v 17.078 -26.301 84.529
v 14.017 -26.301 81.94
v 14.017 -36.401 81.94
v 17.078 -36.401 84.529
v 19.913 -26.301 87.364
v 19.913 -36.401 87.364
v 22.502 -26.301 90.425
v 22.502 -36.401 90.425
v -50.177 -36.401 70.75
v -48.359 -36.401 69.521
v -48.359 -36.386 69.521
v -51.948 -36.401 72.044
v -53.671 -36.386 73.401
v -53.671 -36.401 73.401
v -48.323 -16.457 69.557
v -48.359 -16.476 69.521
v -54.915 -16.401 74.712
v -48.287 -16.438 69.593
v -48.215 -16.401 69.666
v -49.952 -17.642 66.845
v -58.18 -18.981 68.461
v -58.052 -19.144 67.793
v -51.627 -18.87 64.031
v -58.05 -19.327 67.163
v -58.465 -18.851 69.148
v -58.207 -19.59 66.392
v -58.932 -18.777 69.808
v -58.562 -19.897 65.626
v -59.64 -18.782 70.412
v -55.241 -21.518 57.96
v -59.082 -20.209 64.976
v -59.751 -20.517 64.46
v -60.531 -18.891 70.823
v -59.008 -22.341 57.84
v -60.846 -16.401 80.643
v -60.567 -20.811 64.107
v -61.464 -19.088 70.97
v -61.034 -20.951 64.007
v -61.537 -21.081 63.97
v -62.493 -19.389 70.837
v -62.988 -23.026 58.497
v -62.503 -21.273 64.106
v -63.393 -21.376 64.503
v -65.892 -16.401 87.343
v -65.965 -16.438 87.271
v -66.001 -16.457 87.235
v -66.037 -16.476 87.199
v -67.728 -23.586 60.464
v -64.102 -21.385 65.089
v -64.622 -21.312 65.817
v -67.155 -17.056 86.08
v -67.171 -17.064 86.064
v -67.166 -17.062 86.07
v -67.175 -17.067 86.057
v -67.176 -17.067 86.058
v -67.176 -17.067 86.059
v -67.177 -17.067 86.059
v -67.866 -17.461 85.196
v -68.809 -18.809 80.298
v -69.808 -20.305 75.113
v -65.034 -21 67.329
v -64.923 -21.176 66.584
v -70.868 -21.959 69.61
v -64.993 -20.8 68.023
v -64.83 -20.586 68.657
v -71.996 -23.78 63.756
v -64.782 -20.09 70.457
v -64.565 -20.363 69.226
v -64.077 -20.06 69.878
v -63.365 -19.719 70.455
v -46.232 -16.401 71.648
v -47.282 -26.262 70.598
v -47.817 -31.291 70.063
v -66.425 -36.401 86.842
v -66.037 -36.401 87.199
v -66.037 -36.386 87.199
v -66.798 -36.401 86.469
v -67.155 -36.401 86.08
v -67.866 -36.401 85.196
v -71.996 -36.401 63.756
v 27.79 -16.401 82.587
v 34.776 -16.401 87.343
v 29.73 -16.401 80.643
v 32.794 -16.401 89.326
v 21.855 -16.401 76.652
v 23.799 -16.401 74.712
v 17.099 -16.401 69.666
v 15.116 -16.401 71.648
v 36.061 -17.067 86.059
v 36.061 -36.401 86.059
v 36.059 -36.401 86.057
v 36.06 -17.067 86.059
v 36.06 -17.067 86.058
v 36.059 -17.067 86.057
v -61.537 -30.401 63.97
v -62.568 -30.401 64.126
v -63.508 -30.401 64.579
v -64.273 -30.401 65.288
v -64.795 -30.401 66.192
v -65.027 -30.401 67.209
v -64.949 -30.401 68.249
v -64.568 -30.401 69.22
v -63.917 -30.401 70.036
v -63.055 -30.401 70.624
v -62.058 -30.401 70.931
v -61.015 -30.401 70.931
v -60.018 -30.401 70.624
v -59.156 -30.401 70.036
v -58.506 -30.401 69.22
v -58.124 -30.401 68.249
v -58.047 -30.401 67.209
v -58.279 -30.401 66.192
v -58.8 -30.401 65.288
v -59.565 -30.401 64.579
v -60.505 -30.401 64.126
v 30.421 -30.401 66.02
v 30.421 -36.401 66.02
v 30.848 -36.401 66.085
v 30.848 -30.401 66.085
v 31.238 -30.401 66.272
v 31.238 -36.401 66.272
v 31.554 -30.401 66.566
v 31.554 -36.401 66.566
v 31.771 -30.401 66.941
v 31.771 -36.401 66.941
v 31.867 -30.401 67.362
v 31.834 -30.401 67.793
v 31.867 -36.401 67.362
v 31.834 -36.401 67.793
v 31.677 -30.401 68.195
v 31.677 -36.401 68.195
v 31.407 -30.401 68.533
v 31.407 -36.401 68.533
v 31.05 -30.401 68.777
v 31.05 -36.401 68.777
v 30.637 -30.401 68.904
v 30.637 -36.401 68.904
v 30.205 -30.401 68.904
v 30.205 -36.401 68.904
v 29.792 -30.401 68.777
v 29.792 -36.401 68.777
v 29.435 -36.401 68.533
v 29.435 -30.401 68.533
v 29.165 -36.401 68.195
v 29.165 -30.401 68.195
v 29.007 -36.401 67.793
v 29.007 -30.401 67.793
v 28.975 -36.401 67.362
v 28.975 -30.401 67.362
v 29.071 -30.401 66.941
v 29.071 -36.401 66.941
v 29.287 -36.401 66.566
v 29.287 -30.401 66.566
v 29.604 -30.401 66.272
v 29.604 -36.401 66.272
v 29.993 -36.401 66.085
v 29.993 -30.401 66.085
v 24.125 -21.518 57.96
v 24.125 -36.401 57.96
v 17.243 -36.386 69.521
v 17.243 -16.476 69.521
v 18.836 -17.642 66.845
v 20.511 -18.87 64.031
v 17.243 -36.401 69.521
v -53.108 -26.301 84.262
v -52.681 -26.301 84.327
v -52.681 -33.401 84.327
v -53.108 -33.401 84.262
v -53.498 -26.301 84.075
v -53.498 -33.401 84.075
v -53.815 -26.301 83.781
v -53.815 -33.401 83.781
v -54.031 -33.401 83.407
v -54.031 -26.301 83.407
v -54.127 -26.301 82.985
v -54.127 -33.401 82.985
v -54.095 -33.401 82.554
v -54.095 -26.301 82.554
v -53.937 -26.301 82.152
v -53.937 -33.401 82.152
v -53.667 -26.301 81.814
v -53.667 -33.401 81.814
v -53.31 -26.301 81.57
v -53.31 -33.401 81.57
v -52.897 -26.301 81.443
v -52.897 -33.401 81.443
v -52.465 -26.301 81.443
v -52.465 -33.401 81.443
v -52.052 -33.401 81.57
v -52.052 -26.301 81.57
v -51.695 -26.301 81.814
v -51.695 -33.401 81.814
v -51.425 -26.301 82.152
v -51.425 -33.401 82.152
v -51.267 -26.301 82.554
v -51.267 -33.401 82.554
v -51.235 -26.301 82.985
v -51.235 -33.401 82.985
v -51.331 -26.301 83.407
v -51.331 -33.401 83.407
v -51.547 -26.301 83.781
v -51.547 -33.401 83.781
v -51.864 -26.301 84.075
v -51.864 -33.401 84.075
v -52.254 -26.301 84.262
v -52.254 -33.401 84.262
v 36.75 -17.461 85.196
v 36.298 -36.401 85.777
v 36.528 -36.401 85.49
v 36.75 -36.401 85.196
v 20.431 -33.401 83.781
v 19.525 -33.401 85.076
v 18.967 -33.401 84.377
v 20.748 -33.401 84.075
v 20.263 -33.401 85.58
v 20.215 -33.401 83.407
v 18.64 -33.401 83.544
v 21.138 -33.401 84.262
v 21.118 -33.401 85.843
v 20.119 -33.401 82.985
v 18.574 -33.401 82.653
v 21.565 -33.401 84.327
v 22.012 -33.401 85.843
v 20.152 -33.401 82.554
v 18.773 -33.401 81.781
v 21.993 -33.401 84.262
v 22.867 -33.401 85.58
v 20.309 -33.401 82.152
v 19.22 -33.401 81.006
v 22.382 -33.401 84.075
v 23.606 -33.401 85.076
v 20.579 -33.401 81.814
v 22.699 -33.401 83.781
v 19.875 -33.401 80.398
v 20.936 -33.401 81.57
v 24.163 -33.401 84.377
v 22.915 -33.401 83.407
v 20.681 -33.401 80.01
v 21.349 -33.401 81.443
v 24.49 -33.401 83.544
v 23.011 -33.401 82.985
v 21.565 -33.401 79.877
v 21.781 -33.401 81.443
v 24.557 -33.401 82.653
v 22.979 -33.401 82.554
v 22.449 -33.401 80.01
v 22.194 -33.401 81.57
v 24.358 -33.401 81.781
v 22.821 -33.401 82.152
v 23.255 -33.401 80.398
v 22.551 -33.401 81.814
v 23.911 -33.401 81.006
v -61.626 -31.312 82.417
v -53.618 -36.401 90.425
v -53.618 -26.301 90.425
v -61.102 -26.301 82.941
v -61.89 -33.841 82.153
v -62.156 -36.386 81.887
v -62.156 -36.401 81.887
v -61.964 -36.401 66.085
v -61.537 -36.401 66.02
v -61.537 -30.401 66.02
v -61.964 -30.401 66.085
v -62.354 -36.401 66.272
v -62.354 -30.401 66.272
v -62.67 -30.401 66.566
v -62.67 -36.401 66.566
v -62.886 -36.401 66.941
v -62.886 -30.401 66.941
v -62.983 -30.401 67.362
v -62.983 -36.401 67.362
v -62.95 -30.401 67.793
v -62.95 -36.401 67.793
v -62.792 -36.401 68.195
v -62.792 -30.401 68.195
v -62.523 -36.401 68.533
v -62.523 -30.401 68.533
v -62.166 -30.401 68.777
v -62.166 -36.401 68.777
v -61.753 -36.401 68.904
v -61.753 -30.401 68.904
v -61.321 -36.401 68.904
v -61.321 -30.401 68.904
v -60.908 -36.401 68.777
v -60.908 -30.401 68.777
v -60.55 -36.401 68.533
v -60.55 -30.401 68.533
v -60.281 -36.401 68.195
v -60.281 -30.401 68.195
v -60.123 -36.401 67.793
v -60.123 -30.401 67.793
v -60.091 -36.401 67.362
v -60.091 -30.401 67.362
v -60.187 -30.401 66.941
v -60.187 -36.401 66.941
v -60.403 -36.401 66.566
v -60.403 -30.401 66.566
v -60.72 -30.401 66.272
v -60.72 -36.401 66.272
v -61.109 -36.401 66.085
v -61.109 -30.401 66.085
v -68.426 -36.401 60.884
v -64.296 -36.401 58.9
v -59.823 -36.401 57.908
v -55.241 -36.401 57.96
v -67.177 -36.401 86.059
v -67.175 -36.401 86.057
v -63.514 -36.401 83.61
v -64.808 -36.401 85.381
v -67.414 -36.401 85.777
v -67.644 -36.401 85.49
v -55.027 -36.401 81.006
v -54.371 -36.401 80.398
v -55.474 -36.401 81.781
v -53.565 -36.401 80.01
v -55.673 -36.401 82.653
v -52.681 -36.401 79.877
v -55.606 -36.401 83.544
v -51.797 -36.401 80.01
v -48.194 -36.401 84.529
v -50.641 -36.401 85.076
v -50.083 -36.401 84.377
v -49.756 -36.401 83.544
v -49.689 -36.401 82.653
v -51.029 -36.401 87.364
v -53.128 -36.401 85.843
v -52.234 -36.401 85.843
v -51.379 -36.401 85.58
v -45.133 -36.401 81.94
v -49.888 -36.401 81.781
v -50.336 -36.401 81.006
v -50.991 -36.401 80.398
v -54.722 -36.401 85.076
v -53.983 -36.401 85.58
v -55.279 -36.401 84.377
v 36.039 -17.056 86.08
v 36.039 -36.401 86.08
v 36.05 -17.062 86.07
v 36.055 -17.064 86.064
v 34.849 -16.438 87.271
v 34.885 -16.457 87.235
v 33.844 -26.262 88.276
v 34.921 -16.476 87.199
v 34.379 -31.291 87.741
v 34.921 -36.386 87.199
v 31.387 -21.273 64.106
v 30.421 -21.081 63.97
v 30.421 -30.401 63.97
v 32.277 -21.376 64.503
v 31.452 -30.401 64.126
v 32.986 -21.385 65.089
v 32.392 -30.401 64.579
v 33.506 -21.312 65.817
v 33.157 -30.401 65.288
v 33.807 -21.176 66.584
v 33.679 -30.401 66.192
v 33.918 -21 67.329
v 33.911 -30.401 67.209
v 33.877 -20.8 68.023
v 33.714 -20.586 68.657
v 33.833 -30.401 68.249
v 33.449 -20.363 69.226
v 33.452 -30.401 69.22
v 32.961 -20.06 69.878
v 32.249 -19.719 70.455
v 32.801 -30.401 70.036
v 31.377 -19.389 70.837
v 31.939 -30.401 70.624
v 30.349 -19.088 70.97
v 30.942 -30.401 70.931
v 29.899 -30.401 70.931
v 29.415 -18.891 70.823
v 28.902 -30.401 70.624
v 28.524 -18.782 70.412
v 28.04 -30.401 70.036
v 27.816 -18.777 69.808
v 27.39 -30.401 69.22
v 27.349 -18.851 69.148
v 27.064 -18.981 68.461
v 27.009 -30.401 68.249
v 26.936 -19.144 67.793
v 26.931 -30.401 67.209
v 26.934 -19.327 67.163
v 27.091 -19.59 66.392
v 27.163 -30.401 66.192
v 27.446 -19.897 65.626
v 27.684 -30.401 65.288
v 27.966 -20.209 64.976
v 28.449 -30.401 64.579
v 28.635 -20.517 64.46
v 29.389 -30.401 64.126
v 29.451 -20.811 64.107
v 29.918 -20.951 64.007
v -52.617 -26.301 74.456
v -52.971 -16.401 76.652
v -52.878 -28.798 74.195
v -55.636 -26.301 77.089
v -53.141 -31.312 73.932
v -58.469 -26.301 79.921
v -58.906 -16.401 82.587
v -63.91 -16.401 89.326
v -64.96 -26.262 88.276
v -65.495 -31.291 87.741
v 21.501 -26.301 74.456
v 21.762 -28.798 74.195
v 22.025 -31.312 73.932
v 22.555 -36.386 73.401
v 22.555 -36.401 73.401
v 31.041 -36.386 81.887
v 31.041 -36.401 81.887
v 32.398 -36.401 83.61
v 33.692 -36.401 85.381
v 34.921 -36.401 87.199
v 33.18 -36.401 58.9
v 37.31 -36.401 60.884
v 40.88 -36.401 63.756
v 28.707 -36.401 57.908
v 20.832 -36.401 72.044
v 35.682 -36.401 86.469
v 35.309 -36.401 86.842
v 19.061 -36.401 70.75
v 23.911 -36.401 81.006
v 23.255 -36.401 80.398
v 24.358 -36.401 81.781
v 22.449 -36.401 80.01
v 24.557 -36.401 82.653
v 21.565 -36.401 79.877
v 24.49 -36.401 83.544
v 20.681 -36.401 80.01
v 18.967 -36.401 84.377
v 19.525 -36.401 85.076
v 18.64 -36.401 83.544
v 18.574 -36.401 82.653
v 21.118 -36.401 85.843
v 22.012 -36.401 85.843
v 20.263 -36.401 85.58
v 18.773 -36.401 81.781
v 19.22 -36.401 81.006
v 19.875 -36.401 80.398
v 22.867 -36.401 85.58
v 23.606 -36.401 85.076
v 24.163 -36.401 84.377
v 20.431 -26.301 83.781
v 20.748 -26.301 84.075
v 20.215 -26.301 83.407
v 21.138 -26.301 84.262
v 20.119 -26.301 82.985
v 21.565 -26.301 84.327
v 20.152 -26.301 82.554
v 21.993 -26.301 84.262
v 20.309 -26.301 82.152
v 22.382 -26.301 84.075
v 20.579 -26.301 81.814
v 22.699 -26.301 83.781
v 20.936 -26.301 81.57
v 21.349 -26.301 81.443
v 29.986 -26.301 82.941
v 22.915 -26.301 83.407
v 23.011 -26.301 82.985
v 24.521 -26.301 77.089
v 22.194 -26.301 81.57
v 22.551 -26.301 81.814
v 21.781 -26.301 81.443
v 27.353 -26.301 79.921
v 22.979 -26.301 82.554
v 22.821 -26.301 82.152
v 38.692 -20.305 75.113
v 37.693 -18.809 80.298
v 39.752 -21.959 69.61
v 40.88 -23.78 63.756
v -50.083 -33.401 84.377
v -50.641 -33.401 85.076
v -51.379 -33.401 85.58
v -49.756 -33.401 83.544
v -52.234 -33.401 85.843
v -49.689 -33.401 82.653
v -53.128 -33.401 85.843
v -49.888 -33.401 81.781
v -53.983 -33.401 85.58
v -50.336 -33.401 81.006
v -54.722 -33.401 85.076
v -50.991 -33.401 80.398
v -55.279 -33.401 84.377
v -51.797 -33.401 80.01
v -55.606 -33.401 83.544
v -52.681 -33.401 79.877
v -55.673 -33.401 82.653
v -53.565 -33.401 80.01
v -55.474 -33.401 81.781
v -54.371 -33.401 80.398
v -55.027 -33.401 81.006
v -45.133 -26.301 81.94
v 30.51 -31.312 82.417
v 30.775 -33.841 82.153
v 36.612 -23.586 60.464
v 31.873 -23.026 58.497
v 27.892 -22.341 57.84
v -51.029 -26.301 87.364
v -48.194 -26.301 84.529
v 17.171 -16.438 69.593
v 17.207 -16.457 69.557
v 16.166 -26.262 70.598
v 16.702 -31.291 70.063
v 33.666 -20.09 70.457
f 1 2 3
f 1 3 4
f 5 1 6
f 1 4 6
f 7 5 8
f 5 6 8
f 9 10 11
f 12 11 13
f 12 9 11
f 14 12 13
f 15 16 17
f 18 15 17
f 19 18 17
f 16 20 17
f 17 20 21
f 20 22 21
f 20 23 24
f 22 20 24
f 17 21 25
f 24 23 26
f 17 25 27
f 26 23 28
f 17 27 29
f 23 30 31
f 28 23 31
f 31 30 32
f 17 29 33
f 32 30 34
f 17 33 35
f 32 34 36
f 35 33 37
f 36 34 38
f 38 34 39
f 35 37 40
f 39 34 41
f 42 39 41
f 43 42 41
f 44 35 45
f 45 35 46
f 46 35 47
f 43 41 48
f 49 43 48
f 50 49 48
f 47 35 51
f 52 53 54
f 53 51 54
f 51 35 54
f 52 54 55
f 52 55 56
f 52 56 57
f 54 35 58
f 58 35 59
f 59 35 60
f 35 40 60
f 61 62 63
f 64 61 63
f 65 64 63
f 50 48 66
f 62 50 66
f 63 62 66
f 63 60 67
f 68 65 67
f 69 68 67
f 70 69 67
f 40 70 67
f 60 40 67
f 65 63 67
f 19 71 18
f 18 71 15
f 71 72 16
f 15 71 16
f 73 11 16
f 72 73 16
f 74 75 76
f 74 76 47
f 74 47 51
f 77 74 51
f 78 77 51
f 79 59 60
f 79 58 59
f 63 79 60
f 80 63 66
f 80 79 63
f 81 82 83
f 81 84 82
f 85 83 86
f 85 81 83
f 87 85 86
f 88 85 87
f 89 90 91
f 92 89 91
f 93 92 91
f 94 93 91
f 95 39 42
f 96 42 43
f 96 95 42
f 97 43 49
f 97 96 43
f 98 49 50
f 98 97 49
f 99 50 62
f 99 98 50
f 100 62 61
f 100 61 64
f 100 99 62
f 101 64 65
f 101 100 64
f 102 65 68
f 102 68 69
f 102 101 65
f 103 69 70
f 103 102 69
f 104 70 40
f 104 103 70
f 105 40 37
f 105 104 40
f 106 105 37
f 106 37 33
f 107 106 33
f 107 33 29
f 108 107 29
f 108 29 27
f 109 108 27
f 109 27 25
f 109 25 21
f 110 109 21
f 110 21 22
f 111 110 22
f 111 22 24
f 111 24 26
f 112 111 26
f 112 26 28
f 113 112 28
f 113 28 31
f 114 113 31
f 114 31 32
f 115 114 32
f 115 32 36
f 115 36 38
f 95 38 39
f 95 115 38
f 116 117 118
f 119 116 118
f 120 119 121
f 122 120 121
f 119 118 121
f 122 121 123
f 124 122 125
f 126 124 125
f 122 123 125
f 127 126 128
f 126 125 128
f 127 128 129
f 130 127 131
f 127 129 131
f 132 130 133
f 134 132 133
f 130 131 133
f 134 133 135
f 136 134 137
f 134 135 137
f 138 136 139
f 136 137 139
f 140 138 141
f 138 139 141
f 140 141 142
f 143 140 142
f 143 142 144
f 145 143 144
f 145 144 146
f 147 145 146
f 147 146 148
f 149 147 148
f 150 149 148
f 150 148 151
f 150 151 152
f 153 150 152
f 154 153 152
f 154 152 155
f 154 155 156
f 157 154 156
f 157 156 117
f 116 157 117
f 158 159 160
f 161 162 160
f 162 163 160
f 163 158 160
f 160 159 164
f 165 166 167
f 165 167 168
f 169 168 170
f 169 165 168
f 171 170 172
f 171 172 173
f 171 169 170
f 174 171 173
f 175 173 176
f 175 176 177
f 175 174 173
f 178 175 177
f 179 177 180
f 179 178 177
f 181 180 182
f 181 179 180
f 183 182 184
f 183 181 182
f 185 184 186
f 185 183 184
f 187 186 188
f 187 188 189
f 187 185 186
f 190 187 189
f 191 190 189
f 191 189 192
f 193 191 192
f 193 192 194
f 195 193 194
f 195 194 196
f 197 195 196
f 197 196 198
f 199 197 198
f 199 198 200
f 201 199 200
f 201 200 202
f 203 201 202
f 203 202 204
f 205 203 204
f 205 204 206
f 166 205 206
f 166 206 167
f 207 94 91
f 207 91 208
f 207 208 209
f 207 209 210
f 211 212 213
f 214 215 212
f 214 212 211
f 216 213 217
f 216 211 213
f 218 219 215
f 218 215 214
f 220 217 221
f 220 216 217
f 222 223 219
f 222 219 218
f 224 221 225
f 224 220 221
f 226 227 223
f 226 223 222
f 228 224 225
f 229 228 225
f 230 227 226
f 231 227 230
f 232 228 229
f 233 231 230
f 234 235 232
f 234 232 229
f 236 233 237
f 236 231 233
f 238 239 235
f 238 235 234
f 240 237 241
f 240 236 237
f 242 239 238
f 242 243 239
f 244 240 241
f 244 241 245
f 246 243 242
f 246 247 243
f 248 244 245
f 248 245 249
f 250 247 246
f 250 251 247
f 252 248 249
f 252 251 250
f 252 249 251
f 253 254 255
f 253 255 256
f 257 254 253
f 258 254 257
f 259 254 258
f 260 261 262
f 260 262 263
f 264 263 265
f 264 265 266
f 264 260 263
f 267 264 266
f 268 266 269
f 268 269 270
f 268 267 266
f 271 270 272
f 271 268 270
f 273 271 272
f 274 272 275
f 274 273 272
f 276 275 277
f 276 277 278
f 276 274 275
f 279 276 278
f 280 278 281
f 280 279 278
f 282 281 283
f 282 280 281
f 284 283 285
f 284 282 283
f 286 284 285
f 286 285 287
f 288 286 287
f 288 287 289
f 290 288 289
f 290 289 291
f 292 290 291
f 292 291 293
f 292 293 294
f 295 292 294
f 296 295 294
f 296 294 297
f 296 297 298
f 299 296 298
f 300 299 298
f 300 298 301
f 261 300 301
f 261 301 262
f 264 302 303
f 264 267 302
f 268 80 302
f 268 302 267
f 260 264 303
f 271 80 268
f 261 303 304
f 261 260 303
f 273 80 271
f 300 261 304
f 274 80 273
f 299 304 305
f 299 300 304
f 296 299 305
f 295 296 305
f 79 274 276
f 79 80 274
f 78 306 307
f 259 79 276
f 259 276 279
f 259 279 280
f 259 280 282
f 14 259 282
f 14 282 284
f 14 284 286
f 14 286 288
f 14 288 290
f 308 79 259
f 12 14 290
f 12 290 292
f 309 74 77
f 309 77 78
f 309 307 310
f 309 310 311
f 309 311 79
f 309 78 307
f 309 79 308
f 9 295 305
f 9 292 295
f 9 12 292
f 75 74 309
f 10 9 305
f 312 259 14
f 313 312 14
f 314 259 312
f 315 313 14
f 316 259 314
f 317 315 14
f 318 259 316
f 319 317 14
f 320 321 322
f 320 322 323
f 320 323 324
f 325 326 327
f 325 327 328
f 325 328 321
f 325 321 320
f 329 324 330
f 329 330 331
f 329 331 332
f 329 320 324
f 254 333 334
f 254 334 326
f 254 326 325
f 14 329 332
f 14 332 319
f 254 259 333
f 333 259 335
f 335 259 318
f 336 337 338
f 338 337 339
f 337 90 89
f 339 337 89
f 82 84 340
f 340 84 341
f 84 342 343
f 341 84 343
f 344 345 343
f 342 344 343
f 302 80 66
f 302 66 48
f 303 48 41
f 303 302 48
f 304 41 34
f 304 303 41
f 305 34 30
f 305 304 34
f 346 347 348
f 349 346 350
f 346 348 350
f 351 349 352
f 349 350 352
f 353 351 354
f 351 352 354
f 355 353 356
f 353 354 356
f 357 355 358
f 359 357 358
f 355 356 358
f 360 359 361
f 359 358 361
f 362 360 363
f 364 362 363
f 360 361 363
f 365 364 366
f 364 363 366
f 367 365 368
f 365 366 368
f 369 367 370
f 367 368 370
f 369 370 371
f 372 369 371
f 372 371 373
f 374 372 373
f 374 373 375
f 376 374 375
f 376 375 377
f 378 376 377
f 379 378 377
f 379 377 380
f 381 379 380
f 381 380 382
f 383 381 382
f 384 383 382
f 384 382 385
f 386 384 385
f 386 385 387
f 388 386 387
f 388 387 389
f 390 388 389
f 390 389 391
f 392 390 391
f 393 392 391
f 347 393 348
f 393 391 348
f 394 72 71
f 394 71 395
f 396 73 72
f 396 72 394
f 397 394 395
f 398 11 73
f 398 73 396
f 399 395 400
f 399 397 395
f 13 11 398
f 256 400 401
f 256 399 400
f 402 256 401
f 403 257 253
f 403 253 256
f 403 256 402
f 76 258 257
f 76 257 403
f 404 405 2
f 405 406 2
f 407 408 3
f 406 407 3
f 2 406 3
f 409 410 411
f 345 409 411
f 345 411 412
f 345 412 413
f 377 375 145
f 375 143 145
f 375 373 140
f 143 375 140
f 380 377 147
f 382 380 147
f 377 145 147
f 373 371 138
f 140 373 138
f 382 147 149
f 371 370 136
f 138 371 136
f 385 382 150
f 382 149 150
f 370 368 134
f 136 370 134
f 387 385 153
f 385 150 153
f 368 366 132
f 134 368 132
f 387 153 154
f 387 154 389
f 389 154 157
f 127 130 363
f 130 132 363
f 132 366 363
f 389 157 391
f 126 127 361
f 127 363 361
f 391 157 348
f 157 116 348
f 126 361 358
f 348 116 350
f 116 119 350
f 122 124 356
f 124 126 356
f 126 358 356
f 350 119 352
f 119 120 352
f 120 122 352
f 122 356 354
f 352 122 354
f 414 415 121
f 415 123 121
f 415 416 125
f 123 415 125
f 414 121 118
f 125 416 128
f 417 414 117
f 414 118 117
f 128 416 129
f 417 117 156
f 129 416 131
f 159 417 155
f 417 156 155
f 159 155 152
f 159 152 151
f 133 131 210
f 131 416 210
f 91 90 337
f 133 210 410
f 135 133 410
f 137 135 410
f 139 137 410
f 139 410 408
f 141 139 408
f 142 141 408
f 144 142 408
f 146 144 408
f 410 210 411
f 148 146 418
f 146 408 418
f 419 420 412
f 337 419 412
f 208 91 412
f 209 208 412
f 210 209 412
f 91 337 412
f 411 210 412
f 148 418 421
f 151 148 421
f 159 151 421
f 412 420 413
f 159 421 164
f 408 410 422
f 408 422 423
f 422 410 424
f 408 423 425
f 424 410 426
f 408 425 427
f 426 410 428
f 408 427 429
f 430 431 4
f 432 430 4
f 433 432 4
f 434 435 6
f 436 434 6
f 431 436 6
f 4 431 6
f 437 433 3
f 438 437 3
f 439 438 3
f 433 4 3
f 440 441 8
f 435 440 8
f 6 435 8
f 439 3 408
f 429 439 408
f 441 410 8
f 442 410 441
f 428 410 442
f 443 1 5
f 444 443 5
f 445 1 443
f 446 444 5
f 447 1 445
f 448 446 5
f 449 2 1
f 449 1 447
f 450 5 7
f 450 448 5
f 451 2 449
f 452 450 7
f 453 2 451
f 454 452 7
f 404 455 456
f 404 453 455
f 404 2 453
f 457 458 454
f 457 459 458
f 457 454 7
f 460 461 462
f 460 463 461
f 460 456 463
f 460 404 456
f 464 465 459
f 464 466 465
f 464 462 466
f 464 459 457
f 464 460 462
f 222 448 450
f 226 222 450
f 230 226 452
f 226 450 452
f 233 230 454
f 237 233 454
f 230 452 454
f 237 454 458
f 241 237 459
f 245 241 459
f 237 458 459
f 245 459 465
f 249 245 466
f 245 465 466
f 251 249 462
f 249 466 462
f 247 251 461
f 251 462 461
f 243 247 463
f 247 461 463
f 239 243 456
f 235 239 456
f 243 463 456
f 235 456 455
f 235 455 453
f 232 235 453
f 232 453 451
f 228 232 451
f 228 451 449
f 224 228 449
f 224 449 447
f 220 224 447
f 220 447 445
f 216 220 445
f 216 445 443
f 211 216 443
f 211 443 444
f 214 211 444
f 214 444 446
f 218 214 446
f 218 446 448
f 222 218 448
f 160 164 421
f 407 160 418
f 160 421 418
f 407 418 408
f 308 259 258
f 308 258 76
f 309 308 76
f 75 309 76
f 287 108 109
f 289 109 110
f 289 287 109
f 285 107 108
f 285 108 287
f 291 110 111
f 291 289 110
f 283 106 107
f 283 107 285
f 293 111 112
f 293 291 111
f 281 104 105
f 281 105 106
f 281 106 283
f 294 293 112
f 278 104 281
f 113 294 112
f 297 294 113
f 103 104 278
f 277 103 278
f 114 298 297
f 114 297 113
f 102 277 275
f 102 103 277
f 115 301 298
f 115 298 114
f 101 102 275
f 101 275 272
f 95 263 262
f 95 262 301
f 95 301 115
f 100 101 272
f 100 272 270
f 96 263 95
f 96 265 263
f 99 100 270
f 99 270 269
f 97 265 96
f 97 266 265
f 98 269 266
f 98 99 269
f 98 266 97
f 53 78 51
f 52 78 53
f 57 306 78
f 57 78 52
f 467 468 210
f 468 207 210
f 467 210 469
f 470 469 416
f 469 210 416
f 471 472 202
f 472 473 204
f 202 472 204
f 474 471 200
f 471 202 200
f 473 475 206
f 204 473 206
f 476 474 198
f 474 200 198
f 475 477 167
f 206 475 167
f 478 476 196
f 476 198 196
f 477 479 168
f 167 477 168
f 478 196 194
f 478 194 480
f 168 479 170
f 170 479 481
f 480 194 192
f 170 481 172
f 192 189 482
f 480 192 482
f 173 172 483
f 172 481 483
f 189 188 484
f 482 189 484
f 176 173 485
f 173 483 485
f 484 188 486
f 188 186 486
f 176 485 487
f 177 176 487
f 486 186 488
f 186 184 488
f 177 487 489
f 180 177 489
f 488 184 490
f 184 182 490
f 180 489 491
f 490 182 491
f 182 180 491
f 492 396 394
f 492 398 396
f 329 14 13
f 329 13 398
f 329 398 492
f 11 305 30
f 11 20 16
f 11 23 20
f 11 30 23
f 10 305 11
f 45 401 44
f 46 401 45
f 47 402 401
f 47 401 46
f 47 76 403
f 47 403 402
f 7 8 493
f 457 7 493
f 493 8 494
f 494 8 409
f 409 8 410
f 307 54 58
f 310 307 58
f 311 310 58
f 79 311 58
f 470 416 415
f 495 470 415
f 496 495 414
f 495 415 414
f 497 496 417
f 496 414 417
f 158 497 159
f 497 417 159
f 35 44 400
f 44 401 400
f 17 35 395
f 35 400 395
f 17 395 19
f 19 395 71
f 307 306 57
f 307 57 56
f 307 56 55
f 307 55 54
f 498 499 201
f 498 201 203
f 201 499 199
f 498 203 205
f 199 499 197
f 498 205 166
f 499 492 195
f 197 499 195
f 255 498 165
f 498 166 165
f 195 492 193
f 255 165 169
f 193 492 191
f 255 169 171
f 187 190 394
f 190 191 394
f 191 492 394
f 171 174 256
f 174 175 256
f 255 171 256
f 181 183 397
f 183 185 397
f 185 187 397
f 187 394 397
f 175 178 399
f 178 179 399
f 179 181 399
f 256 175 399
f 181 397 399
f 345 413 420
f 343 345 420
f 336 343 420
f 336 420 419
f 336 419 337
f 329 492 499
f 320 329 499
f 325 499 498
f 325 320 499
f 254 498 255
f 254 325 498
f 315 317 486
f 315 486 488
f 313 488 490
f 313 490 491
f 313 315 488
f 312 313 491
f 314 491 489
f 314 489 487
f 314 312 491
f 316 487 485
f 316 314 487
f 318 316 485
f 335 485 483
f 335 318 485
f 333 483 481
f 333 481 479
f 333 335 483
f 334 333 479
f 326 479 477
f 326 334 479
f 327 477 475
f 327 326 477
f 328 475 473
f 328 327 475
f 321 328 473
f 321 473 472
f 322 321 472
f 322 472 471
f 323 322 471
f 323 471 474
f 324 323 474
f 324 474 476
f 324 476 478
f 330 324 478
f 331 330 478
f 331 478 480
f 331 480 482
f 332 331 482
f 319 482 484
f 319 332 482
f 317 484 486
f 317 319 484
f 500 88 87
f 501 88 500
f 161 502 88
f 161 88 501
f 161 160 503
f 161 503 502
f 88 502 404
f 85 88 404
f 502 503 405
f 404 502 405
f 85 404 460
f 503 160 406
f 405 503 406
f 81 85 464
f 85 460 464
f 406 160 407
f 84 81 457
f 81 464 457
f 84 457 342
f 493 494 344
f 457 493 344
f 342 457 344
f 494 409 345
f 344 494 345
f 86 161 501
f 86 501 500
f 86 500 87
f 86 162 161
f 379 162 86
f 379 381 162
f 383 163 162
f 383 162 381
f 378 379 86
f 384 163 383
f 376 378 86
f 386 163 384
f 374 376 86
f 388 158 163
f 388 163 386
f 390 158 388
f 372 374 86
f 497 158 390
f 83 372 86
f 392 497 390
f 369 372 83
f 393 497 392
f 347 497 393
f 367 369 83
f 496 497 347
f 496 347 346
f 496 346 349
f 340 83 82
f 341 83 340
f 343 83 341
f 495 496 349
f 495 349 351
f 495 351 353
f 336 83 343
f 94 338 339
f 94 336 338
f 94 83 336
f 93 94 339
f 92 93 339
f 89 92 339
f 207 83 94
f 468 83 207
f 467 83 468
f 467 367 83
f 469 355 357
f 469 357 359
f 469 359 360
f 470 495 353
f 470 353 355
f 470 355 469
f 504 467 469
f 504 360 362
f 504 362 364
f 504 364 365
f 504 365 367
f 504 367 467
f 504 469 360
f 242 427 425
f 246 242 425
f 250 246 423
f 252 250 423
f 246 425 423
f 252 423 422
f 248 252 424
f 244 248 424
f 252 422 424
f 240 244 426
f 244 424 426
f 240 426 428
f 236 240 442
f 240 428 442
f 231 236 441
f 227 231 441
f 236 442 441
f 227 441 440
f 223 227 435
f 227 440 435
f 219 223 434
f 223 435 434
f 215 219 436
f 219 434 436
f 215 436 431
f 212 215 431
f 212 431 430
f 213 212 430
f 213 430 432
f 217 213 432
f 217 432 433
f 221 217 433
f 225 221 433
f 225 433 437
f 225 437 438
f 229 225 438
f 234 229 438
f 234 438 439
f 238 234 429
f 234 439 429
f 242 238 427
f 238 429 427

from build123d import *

# Parameters (mm, degrees)
SALIENTE_EXTRUIR1_START = -36.400588291
SALIENTE_EXTRUIR1_DEPTH = 10.1
SALIENTE_EXTRUIR2_REACH = 99.517
SALIENTE_EXTRUIR2_START = -2.5
CROQUIS2_W              = 25
CROQUIS2_H              = 20
SALIENTE_EXTRUIR3_REACH = 101.384
CORTAR_EXTRUIR1_START   = -6
CROQUIS5_R              = 3.5
CORTAR_EXTRUIR1_DEPTH   = 19
CROQUIS7_R              = 1.45
CORTAR_EXTRUIR2_DEPTH   = 10
CROQUIS8_R              = 1.45
CORTAR_EXTRUIR3_DEPTH   = 12
CROQUIS9_R              = 3
CORTAR_EXTRUIR4_DEPTH   = 3


# Read off the part's stored shape, not the designer's step: Saliente-Extruir1
with BuildPart() as part:
    # Saliente-Extruir1 outline → Saliente-Extruir1 (new body)
    with BuildSketch(Plane(origin=(0, 0, 0), x_dir=(1, 0, 0), z_dir=(0, 1, 0)).offset(SALIENTE_EXTRUIR1_START)):
        with BuildLine():
            Line((22.502132111, -90.425189571), (33.23240821, -79.694913472))
            Line((33.23240821, -79.694913472), (24.747126835, -71.209632098))
            Line((24.747126835, -71.209632098), (14.016850737, -81.939908197))
            ThreePointArc((14.016850737, -81.939908197), (18.524587161, -85.917453147), (22.502132111, -90.425189571))
        make_face()
    extrude(amount=SALIENTE_EXTRUIR1_DEPTH)

    # Saliente-Extruir2: up to this cone (the profile starts outside it)
    saliente_extruir2_end = Plane(origin=(-15.557959692, -26.400588, 120), z_dir=(0, -1, 0)) * Cone(35.386185904, 82.076939664, 317.497125568, mode=Mode.PRIVATE)
    # Croquis2 → Saliente-Extruir2 (add, up to the surface)
    with BuildSketch(Plane(origin=(-23.231252631, 0, 23.231252631), x_dir=(-0.7071067811865487, 0, -0.7071067811865464), z_dir=(0.7071067811865464, 0, -0.7071067811865487)).offset(SALIENTE_EXTRUIR2_START), mode=Mode.PRIVATE) as saliente_extruir2_sk1:
        with Locations((-73.851674943, -26.400588291)):
            Rectangle(CROQUIS2_W, CROQUIS2_H)
    saliente_extruir2_tool1 = extrude(saliente_extruir2_sk1.sketch, amount=-SALIENTE_EXTRUIR2_REACH, mode=Mode.PRIVATE) - saliente_extruir2_end
    add(saliente_extruir2_tool1.solids().sort_by_distance((27.222001, -26.400588, 77.22004))[0])

    # Saliente-Extruir3: up to this face of the body (flat: up to its plane)
    saliente_extruir3_end = Plane(part.part.faces().sort_by_distance((25.898715454, -16.400588291, 78.543324853))[0])
    # Croquis3 → Saliente-Extruir3 (add, up to the picked face)
    with BuildSketch(Plane.XZ.offset(36.400588291), mode=Mode.PRIVATE) as saliente_extruir3_sk1:
        with BuildLine():
            Line((24.125229727, 57.959611077), (17.243270384, 69.521100394))
            ThreePointArc((17.243270384, 69.521100394), (27.009868535, 77.432171773), (34.920939914, 87.198769923))
            ThreePointArc((34.920939914, 87.198769923), (35.889801945, 86.247084042), (36.74992881, 85.196093352))
            Line((36.74992881, 85.196093352), (40.879917291, 63.755689906))
            ThreePointArc((40.879917291, 63.755689906), (33.179893077, 58.8997272), (24.125229727, 57.959611077))
        make_face()
    saliente_extruir3_tool1 = split(extrude(saliente_extruir3_sk1.sketch, amount=-SALIENTE_EXTRUIR3_REACH, mode=Mode.PRIVATE), bisect_by=saliente_extruir3_end, keep=Keep.BOTH, mode=Mode.PRIVATE)
    add(saliente_extruir3_tool1.solids().sort_by(Axis((30.570444, -36.400588, 69.72951), (0, 1, 0)))[0])

    # Croquis4 → Cortar-Revolución1 (revolve, cut)
    with BuildSketch(Plane(origin=(-15.557959692, -2.400588291, 120), x_dir=(0, 0, -1), z_dir=(1, 0, 0))):
        Polygon((60, -14), (100, -29), (100, -12.364078099), (60, -12.364078099), align=None)
    revolve(axis=Axis((-15.557959692, -2.400588291, 120), (0, -1, 0)), mode=Mode.SUBTRACT)

    # Croquis5 → Cortar-Extruir1 (cut)
    with BuildSketch(Plane.XZ.offset(36.400588291).offset(CORTAR_EXTRUIR1_START)):
        with Locations(Location((30.420802392, 67.470387392, 0), (0, 0, 270))):
            Circle(CROQUIS5_R)
    extrude(amount=-CORTAR_EXTRUIR1_DEPTH, mode=Mode.SUBTRACT)

    # Croquis7 → Cortar-Extruir2 (cut)
    with BuildSketch(Plane.XZ.offset(36.400588291)):
        with Locations(Location((30.420802392, 67.470387392, 0), (0, 0, 270))):
            Circle(CROQUIS7_R)
    extrude(amount=-CORTAR_EXTRUIR2_DEPTH, mode=Mode.SUBTRACT)

    # Croquis8 → Cortar-Extruir3 (cut)
    with BuildSketch(Plane(origin=(0, -26.300588291, 0), x_dir=(1, 0, 0), z_dir=(0, 1, 0))):
        with Locations(Location((21.56514632, -82.876893988, 0), (0, 0, 270))):
            Circle(CROQUIS8_R)
    extrude(amount=-CORTAR_EXTRUIR3_DEPTH, mode=Mode.SUBTRACT)

    # Croquis9 → Cortar-Extruir4 (cut)
    with BuildSketch(Plane.XZ.offset(36.400588291)):
        with Locations(Location((21.56514632, 82.876893988, 0), (0, 0, 270))):
            Circle(CROQUIS9_R)
    extrude(amount=-CORTAR_EXTRUIR4_DEPTH, mode=Mode.SUBTRACT)


with BuildPart() as body_2:
    # Simetría5: mirrored copy
    add(part.part.mirror(Plane(origin=(-15.557959692, -2.400588291, 120), x_dir=(0, 0, 1), z_dir=(1, 0, 0))))


solid = Compound([part.part, body_2.part])
